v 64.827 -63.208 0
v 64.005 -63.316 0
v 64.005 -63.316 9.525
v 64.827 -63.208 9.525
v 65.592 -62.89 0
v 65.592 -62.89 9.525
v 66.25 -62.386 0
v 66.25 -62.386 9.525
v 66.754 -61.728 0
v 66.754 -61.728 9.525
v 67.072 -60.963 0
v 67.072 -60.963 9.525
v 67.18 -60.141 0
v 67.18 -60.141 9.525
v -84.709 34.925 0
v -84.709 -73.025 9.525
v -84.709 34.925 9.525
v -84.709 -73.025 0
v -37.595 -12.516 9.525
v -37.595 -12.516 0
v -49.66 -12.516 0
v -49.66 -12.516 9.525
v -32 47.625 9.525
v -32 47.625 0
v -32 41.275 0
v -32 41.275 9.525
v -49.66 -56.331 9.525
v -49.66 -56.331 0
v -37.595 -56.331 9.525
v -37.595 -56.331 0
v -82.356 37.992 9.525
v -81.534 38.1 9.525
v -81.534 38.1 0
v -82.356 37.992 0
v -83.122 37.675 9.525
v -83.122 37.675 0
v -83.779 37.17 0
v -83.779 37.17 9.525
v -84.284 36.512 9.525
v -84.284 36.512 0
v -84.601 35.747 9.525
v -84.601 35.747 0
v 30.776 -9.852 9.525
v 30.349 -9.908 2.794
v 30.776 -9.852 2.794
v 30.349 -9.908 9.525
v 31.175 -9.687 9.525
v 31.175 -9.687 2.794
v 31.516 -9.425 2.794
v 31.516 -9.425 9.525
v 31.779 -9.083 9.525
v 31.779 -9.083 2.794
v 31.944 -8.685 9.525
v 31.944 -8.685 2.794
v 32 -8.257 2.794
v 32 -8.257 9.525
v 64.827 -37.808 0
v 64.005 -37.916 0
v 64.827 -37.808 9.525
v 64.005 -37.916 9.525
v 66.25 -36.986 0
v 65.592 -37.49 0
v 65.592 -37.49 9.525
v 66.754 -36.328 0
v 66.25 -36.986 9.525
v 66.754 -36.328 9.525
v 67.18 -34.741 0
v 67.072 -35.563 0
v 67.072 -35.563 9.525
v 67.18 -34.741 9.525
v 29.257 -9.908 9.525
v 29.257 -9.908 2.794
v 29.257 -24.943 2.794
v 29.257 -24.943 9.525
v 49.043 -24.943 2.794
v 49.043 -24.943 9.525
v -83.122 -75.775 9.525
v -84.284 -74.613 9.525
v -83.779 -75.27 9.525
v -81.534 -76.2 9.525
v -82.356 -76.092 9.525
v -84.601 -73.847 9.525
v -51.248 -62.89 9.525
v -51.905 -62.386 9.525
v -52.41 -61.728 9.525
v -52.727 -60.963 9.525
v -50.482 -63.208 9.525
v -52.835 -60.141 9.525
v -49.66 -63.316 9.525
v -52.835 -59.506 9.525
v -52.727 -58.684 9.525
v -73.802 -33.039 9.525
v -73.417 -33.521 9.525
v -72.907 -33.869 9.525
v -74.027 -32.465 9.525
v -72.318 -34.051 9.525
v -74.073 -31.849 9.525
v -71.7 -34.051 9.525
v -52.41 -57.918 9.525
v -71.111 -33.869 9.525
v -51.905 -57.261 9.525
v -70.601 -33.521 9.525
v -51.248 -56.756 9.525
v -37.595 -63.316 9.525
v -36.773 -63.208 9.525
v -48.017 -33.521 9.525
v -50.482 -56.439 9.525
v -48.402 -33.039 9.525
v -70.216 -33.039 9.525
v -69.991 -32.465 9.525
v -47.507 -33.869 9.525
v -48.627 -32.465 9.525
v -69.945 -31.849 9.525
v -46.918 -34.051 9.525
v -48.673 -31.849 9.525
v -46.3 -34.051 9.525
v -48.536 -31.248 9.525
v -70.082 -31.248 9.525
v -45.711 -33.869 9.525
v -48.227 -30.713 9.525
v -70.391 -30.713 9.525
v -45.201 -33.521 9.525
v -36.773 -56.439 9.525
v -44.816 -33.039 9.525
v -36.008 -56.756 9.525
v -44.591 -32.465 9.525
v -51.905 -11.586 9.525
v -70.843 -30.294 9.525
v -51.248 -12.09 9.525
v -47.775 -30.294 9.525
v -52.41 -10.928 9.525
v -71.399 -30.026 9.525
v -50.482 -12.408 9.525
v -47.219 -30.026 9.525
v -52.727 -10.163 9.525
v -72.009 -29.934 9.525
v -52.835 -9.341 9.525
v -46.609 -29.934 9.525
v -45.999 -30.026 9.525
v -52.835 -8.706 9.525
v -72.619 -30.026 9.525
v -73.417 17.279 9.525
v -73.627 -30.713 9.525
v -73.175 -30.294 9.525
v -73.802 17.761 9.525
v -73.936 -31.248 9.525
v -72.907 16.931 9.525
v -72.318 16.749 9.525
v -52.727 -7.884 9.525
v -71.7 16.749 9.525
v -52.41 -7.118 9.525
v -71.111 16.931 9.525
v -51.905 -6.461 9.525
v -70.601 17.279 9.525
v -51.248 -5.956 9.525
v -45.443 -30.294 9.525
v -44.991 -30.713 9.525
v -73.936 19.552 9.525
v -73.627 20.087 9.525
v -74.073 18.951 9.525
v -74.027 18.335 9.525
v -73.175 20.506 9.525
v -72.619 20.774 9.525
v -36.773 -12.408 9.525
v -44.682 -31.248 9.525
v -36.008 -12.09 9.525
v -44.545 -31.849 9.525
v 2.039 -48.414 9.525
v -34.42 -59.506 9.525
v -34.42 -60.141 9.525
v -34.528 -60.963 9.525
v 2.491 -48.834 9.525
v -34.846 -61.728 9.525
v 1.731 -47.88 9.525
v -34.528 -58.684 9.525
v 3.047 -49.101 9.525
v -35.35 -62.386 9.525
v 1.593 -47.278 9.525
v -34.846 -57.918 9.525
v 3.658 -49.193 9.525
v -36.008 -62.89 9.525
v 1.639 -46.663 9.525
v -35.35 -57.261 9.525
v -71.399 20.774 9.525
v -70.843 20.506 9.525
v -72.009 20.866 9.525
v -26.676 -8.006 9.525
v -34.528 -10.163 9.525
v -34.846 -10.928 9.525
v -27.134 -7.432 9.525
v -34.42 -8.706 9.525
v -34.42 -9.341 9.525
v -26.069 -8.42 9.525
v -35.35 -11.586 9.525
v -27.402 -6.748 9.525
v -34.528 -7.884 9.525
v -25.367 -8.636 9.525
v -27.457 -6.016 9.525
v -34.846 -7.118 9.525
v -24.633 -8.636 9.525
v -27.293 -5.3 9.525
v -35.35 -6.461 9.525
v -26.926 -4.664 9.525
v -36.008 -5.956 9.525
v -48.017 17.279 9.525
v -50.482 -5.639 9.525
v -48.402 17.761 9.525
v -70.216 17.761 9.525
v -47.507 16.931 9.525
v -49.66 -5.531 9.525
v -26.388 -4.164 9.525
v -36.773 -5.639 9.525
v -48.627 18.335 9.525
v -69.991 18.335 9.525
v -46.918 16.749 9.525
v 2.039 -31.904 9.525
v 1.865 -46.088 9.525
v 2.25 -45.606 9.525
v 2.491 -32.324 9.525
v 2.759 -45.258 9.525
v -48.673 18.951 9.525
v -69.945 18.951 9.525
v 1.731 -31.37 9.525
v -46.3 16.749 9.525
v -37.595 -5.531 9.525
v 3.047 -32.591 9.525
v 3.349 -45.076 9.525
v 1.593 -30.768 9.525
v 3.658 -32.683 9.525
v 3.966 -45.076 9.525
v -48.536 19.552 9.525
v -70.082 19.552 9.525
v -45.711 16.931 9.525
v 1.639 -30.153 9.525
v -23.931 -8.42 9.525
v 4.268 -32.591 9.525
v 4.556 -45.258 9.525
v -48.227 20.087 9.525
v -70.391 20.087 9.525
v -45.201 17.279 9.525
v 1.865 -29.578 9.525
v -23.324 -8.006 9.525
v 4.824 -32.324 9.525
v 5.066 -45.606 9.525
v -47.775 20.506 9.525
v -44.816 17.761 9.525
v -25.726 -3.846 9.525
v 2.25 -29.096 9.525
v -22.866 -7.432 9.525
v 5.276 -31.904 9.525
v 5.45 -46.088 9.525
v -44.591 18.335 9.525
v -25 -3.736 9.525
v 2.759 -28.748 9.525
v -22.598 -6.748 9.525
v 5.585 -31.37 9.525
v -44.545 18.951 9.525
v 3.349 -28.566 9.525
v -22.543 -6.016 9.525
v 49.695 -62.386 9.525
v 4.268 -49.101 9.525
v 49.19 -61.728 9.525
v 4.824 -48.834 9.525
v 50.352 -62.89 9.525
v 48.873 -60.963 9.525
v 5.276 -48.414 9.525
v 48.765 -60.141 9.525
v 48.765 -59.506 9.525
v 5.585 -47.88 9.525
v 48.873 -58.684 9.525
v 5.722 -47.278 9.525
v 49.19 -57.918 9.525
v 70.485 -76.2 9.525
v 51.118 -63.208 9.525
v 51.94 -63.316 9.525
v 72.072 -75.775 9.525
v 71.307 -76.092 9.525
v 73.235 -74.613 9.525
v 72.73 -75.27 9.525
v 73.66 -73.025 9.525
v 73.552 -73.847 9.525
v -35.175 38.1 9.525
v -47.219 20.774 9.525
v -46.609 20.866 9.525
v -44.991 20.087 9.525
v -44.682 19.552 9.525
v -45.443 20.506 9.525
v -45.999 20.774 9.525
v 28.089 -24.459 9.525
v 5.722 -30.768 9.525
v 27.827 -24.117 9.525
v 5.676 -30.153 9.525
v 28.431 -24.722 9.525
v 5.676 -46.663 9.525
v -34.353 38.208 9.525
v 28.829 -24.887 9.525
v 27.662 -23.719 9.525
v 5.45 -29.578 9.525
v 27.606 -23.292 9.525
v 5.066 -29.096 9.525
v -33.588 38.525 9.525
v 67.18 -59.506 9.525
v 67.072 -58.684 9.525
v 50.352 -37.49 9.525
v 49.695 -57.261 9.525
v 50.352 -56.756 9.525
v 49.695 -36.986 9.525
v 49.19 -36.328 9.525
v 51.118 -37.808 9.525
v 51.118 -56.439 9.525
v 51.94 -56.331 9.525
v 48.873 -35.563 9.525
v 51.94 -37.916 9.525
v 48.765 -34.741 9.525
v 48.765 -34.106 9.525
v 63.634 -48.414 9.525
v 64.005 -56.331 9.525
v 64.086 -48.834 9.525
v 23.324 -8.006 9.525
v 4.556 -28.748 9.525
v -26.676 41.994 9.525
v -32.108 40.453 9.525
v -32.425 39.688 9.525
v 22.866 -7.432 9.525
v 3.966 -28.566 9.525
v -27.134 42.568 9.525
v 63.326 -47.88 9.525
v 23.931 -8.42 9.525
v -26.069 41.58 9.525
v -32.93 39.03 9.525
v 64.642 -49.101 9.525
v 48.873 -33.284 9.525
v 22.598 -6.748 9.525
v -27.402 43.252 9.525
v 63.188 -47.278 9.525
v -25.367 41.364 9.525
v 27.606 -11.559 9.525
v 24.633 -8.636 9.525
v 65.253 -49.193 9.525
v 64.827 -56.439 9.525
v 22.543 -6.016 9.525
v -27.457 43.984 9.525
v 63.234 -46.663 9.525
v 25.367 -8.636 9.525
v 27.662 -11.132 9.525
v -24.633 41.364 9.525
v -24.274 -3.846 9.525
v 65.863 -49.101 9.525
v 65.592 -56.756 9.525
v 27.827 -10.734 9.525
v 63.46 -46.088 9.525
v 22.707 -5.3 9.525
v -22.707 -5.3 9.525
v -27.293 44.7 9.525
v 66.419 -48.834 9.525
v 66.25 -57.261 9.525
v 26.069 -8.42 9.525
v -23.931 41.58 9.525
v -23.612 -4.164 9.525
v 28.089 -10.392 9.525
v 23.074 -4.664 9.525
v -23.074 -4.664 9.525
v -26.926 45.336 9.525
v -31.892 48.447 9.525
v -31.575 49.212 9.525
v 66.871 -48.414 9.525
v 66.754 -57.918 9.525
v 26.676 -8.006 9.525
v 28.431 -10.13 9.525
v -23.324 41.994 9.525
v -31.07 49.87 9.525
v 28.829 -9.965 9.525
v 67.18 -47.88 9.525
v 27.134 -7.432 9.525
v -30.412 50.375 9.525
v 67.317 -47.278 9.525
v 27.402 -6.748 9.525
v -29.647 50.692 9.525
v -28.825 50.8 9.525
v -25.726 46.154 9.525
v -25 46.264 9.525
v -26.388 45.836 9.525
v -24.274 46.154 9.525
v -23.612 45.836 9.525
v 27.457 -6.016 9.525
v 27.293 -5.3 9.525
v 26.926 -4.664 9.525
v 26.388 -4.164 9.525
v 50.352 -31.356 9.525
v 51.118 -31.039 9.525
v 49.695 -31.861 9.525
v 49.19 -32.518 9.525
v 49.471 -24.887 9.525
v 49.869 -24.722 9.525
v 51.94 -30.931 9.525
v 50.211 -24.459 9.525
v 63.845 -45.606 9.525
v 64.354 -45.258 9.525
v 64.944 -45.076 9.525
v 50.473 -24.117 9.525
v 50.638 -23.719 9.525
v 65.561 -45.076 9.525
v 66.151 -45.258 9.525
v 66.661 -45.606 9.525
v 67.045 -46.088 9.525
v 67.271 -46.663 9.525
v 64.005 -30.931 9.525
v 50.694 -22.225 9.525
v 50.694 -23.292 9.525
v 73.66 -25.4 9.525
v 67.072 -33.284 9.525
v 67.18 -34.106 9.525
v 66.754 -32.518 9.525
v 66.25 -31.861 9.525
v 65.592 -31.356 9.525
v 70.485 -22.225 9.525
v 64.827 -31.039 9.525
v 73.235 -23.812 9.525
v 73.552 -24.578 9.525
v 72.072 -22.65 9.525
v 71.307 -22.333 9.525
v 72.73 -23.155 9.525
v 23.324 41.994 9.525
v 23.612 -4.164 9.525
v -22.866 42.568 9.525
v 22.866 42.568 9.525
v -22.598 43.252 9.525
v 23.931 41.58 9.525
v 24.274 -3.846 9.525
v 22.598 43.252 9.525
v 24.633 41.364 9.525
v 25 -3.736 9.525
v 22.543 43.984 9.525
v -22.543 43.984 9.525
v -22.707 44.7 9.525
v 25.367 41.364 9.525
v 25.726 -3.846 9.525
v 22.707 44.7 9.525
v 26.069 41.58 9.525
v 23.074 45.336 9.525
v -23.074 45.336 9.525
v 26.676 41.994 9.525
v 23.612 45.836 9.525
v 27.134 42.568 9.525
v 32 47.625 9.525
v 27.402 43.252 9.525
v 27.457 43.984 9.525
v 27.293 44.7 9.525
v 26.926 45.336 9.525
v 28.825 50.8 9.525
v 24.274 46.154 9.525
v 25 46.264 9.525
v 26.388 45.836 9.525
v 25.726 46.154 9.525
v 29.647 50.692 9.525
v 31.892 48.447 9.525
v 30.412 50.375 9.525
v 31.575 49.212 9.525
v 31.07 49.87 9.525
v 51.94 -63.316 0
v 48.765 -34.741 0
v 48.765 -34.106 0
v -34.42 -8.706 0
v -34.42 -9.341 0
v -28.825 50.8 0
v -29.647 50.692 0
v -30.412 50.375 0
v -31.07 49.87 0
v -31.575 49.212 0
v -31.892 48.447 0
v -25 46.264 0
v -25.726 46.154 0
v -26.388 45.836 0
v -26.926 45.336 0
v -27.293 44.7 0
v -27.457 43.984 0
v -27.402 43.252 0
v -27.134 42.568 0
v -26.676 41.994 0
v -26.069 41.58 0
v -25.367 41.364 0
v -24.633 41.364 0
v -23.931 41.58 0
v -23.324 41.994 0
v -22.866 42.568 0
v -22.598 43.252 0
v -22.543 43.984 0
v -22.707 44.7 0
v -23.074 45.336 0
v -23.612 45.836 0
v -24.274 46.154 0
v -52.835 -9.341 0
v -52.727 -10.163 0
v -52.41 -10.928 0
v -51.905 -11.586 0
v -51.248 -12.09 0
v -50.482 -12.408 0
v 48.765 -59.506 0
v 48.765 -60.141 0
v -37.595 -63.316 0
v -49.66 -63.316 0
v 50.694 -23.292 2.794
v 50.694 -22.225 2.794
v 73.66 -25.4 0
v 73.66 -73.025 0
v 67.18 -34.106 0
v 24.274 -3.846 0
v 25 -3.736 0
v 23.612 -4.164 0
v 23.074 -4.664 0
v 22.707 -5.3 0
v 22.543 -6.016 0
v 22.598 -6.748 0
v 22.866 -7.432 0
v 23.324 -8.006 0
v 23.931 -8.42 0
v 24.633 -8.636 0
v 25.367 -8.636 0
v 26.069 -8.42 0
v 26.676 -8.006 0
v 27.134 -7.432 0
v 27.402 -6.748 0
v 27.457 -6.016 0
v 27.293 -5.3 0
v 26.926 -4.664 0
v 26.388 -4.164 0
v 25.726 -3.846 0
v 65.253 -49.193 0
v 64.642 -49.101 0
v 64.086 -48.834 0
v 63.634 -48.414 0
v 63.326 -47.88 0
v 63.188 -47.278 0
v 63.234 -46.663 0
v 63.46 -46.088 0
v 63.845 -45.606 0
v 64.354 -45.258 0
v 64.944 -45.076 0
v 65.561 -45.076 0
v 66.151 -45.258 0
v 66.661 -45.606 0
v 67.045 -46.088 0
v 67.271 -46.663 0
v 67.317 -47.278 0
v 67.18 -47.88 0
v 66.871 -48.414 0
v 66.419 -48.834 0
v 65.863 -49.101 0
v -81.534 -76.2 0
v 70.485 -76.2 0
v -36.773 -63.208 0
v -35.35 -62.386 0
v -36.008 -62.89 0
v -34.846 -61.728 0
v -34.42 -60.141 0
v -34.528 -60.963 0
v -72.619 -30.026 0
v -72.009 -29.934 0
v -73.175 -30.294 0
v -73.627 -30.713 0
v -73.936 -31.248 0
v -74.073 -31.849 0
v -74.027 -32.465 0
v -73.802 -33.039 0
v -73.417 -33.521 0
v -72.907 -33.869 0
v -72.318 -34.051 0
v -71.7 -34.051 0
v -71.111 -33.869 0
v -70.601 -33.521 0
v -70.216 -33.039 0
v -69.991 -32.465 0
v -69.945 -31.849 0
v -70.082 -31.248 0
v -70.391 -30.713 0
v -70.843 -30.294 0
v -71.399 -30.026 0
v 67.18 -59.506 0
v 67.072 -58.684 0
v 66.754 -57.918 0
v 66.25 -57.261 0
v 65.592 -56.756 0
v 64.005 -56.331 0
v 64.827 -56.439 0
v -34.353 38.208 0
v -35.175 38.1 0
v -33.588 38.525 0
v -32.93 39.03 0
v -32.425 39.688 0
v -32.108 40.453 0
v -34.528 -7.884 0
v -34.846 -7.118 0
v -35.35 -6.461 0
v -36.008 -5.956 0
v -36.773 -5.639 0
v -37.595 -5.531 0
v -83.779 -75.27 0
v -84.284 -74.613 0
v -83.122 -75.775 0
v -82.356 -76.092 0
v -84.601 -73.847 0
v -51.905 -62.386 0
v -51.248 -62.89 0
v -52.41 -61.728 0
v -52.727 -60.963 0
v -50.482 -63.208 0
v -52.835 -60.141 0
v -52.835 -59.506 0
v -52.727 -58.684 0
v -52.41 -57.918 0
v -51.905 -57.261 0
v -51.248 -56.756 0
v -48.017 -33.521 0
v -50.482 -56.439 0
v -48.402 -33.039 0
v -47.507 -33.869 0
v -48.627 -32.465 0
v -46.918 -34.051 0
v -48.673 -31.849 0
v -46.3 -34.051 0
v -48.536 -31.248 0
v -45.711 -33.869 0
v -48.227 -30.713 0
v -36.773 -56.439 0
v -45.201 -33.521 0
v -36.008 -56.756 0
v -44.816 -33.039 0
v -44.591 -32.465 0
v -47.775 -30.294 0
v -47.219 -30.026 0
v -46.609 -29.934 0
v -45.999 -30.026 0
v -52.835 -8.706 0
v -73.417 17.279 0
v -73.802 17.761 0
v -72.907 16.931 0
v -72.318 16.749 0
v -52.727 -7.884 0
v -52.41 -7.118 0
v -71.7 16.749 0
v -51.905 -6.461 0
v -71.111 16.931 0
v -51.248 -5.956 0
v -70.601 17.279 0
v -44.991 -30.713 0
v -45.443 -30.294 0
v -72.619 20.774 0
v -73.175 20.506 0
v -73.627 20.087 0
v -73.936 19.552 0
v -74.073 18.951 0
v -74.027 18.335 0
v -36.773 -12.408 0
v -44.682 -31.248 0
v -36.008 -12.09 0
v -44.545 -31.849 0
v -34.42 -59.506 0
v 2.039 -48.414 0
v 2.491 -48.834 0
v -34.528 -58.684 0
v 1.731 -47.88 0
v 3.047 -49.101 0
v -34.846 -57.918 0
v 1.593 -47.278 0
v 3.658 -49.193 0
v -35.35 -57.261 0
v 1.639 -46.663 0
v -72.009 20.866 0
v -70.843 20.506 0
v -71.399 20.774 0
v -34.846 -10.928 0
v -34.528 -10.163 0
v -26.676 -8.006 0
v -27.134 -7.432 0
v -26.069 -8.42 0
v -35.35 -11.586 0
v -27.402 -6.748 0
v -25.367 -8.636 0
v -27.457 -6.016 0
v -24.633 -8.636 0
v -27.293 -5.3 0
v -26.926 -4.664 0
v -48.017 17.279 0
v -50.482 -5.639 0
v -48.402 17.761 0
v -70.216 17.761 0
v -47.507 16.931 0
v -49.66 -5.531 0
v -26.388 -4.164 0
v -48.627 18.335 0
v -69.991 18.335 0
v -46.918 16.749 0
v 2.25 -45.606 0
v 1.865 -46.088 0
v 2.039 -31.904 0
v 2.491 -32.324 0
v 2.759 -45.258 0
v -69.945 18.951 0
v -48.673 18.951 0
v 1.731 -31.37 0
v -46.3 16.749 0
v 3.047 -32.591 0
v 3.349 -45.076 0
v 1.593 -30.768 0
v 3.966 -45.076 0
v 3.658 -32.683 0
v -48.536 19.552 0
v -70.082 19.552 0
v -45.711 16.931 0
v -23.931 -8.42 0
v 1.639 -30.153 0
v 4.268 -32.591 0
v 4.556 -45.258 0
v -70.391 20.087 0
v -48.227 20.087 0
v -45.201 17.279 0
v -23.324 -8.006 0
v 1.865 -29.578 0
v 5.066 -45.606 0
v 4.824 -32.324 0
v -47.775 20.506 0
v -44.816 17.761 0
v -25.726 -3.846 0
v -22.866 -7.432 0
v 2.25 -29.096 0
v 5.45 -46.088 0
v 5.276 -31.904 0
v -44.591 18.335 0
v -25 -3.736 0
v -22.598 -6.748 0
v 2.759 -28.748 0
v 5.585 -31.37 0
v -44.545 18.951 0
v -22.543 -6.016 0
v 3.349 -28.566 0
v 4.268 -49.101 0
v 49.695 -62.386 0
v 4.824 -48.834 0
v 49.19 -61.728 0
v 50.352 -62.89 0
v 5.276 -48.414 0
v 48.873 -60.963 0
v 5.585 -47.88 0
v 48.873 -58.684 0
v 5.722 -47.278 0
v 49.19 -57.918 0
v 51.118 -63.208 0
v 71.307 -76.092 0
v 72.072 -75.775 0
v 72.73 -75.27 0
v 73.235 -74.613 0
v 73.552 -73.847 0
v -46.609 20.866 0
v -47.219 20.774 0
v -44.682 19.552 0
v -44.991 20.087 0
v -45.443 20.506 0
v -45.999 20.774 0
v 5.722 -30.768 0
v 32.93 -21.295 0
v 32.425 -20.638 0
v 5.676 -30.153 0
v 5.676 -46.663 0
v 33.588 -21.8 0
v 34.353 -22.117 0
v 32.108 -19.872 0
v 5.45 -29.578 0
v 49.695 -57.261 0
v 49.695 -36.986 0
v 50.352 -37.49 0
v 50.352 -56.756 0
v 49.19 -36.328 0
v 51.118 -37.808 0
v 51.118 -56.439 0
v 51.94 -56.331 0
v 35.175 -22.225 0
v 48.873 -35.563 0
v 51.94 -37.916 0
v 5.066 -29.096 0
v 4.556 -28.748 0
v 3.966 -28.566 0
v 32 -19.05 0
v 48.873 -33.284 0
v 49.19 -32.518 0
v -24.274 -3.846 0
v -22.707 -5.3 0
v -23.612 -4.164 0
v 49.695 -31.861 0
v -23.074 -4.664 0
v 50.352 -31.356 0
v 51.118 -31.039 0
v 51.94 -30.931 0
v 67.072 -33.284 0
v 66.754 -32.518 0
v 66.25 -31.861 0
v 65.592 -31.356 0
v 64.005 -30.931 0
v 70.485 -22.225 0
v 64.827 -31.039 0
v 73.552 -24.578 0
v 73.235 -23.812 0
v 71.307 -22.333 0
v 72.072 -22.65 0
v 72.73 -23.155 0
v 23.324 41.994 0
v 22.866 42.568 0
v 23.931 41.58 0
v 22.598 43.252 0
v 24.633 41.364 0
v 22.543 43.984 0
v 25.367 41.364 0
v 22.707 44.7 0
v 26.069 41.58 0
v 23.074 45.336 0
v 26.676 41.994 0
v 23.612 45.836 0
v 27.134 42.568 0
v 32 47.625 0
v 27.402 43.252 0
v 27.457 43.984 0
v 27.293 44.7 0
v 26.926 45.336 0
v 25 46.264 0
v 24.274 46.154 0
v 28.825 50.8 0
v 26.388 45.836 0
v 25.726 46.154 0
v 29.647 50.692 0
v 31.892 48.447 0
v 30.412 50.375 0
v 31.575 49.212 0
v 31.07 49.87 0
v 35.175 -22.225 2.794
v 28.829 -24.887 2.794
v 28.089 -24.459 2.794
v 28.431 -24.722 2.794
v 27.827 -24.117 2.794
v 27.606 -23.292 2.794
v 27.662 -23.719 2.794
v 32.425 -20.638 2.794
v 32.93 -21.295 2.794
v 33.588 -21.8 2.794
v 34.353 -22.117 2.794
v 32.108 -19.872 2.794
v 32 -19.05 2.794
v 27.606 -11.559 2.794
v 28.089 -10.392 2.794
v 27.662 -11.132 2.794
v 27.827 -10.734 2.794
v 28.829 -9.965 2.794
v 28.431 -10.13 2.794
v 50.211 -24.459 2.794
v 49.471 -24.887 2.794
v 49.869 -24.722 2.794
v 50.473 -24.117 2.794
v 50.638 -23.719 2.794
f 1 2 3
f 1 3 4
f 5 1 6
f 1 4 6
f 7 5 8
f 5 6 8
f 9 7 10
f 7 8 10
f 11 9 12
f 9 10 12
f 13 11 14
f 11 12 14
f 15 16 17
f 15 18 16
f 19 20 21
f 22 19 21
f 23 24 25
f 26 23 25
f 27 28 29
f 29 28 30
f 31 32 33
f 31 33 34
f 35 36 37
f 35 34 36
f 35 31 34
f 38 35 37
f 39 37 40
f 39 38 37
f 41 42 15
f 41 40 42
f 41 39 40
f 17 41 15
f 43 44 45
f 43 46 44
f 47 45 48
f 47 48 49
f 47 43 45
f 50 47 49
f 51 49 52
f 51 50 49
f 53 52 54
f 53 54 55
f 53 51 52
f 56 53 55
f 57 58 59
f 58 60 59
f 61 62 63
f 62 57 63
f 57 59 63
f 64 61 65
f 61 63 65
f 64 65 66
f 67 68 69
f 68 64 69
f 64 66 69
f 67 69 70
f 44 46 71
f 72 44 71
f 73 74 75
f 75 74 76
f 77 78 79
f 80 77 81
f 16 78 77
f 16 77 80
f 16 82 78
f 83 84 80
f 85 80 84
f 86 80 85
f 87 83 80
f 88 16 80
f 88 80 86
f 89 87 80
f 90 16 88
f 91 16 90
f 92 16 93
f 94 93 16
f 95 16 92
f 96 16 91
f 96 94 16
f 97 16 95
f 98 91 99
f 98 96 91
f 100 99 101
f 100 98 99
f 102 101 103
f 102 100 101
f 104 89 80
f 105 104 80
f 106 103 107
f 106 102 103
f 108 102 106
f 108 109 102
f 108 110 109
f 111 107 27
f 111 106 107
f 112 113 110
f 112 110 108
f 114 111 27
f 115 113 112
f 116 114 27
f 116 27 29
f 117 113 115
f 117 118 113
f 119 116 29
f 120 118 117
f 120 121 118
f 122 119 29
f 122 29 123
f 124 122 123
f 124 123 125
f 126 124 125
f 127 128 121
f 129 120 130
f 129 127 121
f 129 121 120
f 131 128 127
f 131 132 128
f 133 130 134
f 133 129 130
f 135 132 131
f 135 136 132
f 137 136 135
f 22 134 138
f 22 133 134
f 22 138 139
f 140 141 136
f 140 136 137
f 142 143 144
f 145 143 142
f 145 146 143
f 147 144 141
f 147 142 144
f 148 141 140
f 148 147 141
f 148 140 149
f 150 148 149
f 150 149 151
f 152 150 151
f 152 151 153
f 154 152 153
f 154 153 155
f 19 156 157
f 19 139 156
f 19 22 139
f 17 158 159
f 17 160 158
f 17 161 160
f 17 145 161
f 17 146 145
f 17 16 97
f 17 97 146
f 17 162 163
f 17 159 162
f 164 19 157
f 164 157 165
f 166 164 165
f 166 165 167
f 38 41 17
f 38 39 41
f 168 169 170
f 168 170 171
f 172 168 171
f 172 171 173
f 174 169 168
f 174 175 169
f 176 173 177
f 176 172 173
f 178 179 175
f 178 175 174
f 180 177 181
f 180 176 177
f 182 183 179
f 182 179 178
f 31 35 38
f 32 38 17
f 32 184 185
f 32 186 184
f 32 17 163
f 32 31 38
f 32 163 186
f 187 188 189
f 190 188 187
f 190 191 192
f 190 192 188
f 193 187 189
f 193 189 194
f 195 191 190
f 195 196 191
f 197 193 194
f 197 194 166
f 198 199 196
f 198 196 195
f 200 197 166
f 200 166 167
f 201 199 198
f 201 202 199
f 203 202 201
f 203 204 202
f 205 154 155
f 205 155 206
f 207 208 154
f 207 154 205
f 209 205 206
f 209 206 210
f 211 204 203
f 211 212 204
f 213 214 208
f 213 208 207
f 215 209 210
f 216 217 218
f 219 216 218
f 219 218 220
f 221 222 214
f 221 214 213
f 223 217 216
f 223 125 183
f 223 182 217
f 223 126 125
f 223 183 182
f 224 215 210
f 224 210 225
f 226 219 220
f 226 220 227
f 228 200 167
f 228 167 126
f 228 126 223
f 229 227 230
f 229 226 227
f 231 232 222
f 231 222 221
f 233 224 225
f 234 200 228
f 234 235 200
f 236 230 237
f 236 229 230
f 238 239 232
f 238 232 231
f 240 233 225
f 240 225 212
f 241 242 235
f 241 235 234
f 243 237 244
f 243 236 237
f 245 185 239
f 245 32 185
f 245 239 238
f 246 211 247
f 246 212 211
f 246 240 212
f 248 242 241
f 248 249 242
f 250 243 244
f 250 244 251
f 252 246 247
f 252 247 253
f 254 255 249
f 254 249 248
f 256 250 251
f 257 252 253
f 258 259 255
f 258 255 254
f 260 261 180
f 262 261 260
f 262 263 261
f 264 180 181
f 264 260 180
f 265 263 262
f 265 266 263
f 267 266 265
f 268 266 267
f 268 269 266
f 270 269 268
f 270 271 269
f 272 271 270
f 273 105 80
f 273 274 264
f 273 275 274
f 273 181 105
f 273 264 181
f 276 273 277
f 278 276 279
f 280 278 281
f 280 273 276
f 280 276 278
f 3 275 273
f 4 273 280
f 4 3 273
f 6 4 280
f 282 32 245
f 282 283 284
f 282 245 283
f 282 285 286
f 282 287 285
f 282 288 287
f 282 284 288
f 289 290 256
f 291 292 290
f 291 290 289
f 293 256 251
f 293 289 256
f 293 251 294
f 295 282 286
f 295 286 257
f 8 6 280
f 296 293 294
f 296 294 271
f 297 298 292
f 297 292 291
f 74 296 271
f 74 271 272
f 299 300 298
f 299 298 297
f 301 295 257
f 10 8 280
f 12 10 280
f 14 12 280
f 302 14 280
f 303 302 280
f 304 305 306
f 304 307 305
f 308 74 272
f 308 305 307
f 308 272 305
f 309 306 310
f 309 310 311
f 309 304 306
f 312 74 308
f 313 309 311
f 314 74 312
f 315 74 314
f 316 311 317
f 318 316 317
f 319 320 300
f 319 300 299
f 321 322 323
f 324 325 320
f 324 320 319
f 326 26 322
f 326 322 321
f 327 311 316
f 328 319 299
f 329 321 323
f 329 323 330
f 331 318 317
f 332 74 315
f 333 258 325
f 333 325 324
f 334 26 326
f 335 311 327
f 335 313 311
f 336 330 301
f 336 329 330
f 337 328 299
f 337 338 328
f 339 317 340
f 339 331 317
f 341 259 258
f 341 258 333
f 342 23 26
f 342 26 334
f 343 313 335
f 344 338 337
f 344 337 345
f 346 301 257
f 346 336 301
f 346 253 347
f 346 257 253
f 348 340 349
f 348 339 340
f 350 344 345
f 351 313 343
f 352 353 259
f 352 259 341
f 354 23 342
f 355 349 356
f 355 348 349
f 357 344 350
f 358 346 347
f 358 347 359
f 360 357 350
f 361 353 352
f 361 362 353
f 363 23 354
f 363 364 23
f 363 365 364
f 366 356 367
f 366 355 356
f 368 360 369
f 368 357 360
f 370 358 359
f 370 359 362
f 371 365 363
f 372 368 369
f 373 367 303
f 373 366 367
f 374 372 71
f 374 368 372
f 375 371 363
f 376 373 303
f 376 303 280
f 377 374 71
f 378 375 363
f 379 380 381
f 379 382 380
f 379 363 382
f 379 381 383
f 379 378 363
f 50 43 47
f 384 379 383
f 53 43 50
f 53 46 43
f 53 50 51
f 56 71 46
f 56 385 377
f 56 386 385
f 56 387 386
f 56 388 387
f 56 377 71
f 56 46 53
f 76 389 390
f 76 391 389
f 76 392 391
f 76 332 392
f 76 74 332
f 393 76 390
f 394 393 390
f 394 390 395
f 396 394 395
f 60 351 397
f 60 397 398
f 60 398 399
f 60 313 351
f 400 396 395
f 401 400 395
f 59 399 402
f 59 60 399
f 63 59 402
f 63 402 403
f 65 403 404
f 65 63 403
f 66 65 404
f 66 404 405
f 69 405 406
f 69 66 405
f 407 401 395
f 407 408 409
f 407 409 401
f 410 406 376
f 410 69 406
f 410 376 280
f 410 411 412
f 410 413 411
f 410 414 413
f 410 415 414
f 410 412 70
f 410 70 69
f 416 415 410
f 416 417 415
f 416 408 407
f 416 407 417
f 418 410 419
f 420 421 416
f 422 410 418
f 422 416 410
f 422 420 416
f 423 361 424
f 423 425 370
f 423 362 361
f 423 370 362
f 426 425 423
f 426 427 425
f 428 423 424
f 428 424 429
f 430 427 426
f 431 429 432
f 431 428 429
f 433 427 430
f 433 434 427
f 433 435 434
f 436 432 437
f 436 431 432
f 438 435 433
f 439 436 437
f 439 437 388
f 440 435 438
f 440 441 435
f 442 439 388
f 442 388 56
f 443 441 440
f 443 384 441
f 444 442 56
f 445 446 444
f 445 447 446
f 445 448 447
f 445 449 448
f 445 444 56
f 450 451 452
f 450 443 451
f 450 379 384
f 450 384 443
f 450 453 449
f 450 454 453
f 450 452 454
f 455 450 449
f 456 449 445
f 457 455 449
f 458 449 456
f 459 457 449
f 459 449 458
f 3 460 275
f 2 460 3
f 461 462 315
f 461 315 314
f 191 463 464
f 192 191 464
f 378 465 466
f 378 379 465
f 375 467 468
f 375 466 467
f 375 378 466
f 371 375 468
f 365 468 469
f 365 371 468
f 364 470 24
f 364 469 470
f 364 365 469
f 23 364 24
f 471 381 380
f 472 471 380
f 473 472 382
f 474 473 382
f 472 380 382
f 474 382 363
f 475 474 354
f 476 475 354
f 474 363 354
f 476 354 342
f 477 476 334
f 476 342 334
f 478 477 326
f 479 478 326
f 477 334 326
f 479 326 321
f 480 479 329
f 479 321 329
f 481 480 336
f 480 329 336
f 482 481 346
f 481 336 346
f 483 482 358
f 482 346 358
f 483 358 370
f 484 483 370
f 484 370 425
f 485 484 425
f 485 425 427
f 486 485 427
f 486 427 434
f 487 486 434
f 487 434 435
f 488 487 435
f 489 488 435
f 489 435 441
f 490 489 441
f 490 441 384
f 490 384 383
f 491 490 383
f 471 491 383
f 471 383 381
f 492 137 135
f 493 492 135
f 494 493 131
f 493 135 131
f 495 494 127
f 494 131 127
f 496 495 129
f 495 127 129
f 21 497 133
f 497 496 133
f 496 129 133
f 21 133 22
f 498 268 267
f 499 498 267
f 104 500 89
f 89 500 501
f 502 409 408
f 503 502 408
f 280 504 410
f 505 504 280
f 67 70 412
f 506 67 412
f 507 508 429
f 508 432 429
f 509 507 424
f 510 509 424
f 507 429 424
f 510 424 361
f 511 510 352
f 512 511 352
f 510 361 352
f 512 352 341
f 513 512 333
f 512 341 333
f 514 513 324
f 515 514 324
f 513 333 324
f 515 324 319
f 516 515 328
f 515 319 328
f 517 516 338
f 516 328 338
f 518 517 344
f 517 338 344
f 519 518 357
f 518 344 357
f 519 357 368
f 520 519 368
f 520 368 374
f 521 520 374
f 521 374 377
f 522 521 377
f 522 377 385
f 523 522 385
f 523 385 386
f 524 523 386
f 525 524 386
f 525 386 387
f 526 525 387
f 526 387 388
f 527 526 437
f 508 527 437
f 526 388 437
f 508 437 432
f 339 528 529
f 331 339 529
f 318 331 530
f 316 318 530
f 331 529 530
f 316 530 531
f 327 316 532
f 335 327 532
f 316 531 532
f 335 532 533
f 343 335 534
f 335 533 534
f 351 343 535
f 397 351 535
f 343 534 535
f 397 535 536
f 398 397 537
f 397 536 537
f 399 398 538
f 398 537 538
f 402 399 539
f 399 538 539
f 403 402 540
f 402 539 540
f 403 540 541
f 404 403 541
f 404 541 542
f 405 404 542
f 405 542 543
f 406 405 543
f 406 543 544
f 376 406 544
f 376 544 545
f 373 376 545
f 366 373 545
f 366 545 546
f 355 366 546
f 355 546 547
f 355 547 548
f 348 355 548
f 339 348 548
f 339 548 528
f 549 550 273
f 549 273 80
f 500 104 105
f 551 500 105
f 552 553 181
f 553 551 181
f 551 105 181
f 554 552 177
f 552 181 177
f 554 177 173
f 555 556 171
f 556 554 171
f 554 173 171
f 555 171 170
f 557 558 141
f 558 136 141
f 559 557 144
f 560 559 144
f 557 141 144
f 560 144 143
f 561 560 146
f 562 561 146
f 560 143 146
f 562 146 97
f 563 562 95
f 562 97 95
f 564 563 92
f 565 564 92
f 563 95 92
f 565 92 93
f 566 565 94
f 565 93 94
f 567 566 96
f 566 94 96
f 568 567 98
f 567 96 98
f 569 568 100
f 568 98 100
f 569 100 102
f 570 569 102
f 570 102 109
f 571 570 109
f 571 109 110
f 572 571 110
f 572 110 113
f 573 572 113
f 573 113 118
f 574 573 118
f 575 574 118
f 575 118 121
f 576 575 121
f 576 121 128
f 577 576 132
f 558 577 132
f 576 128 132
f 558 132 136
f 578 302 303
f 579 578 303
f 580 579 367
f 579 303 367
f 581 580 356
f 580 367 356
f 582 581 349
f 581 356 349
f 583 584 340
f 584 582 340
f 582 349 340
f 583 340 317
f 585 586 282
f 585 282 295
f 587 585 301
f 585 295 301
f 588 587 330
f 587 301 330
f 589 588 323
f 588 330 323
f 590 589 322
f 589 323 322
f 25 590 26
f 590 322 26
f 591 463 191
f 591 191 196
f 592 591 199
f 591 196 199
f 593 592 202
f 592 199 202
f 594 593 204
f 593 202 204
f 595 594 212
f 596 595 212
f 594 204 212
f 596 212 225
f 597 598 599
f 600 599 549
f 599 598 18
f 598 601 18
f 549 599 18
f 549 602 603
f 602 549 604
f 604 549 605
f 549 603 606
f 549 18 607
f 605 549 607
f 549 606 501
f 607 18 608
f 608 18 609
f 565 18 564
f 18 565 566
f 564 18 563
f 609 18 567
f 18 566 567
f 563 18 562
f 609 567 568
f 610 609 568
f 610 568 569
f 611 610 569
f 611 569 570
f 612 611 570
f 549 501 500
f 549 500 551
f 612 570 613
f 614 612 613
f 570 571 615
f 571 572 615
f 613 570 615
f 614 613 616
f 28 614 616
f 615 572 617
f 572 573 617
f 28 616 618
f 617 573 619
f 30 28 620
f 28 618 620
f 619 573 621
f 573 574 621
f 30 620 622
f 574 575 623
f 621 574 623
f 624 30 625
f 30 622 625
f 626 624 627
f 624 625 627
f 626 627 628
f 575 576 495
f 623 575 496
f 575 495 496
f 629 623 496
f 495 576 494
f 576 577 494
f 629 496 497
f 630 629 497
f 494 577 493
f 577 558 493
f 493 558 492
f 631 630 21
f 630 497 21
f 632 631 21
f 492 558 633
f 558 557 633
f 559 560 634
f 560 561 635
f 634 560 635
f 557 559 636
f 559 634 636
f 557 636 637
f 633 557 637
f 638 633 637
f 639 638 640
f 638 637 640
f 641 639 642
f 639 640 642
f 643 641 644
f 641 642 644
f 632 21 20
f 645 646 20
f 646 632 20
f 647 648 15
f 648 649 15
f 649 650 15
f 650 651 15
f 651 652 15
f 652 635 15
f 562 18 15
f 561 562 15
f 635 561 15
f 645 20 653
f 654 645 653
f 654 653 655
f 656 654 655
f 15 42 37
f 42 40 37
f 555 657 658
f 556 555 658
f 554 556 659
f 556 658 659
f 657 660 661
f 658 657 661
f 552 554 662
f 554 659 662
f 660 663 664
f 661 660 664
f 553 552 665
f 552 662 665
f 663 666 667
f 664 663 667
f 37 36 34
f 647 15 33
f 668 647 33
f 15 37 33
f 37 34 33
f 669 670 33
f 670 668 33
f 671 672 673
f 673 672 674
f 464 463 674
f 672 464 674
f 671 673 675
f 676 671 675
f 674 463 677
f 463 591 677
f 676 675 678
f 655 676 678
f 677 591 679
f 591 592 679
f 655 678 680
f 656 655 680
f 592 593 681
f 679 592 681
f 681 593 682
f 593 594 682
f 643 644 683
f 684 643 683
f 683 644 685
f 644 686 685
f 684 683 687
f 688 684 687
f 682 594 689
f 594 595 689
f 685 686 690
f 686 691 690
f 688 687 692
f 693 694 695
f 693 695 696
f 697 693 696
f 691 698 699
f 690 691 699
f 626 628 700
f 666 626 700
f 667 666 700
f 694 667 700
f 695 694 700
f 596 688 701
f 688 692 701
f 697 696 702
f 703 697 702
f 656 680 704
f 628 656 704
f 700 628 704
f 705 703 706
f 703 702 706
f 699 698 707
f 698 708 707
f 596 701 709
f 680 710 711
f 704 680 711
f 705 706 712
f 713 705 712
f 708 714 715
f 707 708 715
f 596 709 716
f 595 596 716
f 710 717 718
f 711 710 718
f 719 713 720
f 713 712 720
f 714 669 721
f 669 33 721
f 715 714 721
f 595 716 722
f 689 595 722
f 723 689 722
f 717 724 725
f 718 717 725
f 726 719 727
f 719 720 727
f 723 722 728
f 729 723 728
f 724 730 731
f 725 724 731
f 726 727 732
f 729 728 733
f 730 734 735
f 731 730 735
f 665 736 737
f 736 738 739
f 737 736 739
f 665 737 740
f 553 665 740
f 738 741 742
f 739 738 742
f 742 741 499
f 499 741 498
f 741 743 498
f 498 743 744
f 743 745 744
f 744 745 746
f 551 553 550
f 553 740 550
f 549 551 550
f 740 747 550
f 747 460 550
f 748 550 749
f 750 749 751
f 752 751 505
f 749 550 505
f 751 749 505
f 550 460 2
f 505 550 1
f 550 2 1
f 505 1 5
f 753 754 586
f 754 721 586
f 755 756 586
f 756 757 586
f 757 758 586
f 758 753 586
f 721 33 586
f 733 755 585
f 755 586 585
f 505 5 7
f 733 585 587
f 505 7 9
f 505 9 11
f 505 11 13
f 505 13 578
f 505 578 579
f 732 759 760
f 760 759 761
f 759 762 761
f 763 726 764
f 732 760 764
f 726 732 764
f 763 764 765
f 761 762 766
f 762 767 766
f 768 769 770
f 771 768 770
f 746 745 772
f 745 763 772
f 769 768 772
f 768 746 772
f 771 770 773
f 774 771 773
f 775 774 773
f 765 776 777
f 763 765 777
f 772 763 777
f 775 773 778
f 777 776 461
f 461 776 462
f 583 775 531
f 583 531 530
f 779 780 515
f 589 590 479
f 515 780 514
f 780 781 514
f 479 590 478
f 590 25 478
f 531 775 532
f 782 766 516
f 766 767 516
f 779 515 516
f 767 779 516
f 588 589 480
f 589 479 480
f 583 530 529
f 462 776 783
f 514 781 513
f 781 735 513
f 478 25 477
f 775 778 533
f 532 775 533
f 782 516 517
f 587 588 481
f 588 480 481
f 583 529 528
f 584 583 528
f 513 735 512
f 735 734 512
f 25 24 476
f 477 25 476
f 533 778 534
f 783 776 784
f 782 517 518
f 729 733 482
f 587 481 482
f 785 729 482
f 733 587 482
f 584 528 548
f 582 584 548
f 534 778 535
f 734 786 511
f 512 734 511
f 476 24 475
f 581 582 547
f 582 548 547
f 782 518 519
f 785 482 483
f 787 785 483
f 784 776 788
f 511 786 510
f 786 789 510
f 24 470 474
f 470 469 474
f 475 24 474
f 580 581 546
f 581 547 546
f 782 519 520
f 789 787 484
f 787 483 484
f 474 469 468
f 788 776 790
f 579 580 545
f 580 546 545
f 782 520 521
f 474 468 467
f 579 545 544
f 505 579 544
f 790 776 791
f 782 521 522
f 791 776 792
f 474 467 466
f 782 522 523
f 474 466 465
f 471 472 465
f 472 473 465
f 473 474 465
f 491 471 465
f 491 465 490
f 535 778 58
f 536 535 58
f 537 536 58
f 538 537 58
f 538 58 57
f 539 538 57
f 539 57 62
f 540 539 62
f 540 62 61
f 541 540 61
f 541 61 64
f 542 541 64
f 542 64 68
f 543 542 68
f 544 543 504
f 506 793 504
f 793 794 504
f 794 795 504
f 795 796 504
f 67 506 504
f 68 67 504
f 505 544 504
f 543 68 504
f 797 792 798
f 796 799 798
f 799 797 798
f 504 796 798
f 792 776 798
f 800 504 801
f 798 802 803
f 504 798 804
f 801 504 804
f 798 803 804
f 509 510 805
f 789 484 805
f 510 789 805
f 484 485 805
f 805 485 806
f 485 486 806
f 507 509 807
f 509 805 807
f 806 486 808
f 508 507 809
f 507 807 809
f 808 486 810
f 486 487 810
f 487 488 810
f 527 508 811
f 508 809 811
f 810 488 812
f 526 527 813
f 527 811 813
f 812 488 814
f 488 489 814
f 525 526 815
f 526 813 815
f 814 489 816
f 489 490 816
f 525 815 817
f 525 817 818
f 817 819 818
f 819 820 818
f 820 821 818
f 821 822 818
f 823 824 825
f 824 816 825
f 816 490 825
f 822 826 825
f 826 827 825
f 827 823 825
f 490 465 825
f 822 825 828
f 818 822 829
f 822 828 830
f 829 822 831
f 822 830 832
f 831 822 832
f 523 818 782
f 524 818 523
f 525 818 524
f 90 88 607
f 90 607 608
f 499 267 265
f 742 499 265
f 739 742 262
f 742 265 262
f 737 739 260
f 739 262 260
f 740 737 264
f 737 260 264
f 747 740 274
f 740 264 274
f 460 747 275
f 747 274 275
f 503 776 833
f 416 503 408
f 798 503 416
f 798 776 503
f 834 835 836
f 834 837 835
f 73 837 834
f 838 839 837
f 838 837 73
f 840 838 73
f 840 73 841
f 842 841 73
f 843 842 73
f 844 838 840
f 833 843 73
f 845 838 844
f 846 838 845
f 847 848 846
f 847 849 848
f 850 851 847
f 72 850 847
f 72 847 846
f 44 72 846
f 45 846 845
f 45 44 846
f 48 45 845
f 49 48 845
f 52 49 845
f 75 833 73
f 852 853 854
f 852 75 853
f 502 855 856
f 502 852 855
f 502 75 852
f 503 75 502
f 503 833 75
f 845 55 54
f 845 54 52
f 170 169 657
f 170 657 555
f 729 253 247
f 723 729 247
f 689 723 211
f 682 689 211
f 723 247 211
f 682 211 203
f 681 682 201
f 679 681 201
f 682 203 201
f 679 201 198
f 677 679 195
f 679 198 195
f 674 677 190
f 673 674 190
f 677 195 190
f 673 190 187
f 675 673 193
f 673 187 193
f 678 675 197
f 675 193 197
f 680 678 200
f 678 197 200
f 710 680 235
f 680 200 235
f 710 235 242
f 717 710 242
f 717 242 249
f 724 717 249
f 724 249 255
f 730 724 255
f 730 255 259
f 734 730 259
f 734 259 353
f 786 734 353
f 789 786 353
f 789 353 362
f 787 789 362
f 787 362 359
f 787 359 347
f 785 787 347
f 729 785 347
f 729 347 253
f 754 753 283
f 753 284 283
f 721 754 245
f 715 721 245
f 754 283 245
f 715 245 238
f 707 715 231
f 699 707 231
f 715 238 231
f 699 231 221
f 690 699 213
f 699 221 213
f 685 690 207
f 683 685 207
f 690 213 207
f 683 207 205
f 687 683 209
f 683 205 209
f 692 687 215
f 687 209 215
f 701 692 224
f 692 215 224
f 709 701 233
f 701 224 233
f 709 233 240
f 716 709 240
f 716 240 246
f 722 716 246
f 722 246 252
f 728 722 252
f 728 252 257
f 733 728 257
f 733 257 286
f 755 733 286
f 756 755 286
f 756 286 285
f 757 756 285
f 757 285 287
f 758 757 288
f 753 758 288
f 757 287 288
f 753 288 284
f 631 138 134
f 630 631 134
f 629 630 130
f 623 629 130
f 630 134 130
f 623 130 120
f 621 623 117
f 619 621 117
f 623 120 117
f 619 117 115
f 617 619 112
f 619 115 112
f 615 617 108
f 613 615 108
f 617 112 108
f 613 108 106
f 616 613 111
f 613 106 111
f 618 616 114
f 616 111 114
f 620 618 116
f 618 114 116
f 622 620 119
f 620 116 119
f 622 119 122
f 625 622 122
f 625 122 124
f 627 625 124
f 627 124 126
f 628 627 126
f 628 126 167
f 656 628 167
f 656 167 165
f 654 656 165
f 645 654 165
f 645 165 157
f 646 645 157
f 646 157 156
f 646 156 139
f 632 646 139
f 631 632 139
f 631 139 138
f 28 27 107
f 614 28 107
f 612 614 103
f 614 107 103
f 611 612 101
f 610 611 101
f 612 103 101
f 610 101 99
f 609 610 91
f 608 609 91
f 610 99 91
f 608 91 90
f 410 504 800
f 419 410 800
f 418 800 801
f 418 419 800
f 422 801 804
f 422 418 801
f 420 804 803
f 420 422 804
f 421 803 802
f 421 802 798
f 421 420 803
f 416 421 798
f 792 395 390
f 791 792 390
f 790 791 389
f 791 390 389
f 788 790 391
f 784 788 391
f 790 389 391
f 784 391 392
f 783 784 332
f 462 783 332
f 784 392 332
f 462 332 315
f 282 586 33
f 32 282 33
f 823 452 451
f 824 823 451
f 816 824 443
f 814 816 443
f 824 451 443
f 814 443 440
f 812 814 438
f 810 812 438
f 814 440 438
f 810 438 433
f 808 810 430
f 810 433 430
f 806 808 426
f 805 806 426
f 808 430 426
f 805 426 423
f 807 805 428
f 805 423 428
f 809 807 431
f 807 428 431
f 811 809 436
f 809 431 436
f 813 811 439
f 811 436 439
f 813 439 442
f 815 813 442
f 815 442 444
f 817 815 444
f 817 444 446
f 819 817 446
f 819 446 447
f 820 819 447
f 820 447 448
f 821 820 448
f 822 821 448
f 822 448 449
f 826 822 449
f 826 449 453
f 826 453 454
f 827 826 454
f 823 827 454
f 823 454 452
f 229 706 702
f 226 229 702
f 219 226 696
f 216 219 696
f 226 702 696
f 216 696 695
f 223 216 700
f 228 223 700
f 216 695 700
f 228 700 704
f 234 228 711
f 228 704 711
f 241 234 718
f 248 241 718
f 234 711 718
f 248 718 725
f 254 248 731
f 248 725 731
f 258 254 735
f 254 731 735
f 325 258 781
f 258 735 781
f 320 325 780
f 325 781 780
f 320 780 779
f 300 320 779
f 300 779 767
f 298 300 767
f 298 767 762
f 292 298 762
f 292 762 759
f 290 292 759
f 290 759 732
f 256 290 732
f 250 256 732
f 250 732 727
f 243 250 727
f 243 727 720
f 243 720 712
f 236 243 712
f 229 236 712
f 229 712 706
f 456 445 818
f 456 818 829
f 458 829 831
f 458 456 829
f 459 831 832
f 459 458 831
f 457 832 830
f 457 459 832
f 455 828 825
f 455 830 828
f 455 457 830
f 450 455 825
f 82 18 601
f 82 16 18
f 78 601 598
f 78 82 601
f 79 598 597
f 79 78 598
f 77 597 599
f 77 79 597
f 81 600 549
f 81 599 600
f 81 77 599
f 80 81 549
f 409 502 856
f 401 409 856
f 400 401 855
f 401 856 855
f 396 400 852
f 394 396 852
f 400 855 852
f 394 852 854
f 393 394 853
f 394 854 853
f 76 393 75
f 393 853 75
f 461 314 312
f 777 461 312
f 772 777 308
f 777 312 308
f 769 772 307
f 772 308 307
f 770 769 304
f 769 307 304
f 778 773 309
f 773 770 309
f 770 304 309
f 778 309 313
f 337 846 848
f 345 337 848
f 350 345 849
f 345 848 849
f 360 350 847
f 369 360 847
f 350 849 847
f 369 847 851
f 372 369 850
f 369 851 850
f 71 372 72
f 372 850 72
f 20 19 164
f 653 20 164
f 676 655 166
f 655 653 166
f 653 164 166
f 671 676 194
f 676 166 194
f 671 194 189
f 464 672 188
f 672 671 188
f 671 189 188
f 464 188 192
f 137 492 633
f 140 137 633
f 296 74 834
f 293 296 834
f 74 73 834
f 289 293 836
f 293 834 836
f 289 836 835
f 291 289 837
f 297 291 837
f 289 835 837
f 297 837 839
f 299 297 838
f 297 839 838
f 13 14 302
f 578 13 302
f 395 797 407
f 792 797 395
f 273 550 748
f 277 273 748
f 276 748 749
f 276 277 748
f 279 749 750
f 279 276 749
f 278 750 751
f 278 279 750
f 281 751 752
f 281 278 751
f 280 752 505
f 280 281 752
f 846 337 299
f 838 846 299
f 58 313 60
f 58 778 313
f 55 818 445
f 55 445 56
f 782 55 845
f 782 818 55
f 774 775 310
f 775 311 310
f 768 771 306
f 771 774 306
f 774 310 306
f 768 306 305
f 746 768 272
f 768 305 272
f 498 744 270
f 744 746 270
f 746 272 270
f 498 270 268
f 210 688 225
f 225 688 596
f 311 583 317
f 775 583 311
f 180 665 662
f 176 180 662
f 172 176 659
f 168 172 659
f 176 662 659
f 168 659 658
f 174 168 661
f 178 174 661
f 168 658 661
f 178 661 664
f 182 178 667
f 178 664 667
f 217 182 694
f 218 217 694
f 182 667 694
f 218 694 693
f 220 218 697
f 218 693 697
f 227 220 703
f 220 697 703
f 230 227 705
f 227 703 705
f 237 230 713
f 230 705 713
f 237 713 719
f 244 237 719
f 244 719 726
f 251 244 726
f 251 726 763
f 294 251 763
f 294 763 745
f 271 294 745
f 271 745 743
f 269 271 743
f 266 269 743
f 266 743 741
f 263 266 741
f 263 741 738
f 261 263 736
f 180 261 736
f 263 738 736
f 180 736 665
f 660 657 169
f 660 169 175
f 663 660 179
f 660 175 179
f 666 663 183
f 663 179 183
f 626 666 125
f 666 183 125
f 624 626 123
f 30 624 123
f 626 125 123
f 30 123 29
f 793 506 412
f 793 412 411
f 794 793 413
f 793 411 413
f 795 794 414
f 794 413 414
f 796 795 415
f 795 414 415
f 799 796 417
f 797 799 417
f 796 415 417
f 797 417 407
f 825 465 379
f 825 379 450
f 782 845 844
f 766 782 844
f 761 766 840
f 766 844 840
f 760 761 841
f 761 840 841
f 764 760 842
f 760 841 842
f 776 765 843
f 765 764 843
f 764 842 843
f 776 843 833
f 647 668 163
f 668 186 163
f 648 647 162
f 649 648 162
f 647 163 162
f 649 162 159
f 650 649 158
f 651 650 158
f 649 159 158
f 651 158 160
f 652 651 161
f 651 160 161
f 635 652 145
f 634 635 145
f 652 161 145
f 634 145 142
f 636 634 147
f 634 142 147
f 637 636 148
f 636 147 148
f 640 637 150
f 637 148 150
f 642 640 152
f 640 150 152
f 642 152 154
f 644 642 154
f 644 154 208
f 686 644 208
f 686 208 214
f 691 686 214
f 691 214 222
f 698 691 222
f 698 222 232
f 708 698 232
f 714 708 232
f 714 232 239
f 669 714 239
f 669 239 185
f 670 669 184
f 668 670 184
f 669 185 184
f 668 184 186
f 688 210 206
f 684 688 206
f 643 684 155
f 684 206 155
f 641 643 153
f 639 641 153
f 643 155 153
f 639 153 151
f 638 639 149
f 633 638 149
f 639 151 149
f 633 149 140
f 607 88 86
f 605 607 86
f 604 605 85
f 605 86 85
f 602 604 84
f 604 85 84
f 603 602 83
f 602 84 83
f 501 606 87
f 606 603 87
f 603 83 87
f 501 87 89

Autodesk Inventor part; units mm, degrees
ref_plane "YZ Plane" through (0, 0, 0) normal (1, 0, 0) x (0, 1, 0)
ref_plane "XZ Plane" through (0, 0, 0) normal (0, 1, 0) x (-1, 0, 0)
ref_plane "XY Plane" through (0, 0, 0) normal (0, 0, 1) x (1, 0, 0)
sketch "Sketch1" plane through (0, 0, 0) normal (0, 0, 1) x (1, 0, 0)
  line L0 (73.66, -76.2) -> (-84.709, -76.2)
  line L1 (-84.709, -76.2) -> (-84.709, 50.8)
  line L2 (-84.709, 50.8) -> (73.66, 50.8)
  line L3 (73.66, 50.8) -> (73.66, -76.2)
  line L4 (-84.709, 50.8) -> (-32, 50.8)
  line L5 (-32, 50.8) -> (-32, 38.1)
  line L6 (-32, 38.1) -> (-84.709, 38.1)
  line L7 (-84.709, 38.1) -> (-84.709, 50.8)
  line L8 (73.66, 50.8) -> (32, 50.8)
  line L9 (32, 50.8) -> (32, -22.225)
  line L10 (32, -22.225) -> (73.66, -22.225)
  line L11 (73.66, -22.225) -> (73.66, 50.8)
  line L12 (-34.4202, -12.5158) -> (-52.8352, -12.5158)
  line L13 (-52.8352, -12.5158) -> (-52.8352, -5.5308)
  line L14 (-52.8352, -5.5308) -> (-34.4202, -5.5308)
  line L15 (-34.4202, -5.5308) -> (-34.4202, -12.5158)
  line L16 (-34.4202, -12.5158) -> (-52.8352, -5.5308) construction
  line L17 (-52.8352, -12.5158) -> (-34.4202, -5.5308) construction
  line L18 (-34.4202, -63.3158) -> (-52.8352, -63.3158)
  line L19 (-52.8352, -63.3158) -> (-52.8352, -56.3308)
  line L20 (-52.8352, -56.3308) -> (-34.4202, -56.3308)
  line L21 (-34.4202, -56.3308) -> (-34.4202, -63.3158)
  line L22 (-34.4202, -63.3158) -> (-52.8352, -56.3308) construction
  line L23 (-52.8352, -63.3158) -> (-34.4202, -56.3308) construction
  line L24 (48.7648, -63.3158) -> (67.1798, -63.3158)
  line L25 (67.1798, -63.3158) -> (67.1798, -56.3308)
  line L26 (67.1798, -56.3308) -> (48.7648, -56.3308)
  line L27 (48.7648, -56.3308) -> (48.7648, -63.3158)
  line L28 (48.7648, -63.3158) -> (67.1798, -56.3308) construction
  line L29 (67.1798, -63.3158) -> (48.7648, -56.3308) construction
  line L30 (-43.6277, -59.8233) -> (-43.6277, -9.0233) construction
  line L31 (-43.6277, -59.8233) -> (-43.6277, -56.3308) construction
  line L32 (-25, 43.8) -> (25, 43.8) construction
  line L33 (25, 43.8) -> (25, -6.2) construction
  line L34 (25, -6.2) -> (-25, -6.2) construction
  line L35 (-25, -6.2) -> (-25, 43.8) construction
  line L36 (-25, 18.8) -> (25, 18.8) construction
  line L37 (57.9723, -59.8233) -> (-43.6277, -59.8233) construction
  line L38 (0, 43.8) -> (0, -6.2) construction
  line L39 (32, -13.2) -> (-32, -13.2) construction
  line L40 (-32, -13.2) -> (-32, 50.8) construction
  line L41 (-32, 50.8) -> (32, 50.8) construction
  line L42 (32, 50.8) -> (32, -13.2) construction
  line L43 (32, -13.2) -> (-32, 50.8) construction
  line L44 (-32, -13.2) -> (32, 50.8) construction
  circle A0 centre (-37.6333, -9.0233) radius 3.0299 construction
  circle A1 centre (-43.6277, -9.0233) radius 2.9972 construction
  circle A2 centre (-37.6333, -9.0233) radius 4.7625 construction
  line L45 (0, 76.2) -> (0, -101.6) projected
  line L46 (57.9723, -59.8233) -> (57.9723, -34.4233) construction
  line L47 (67.1798, -30.9308) -> (48.7648, -30.9308)
  line L48 (48.7648, -30.9308) -> (48.7648, -37.9158)
  line L49 (48.7648, -37.9158) -> (67.1798, -37.9158)
  line L50 (67.1798, -37.9158) -> (67.1798, -30.9308)
  line L51 (67.1798, -30.9308) -> (48.7648, -37.9158) construction
  line L52 (48.7648, -30.9308) -> (67.1798, -37.9158) construction
  point P0 (0, 0)
  point P1 (0, 0)
  point P2 (0, 0)
  point P3 (0, 18.8)
  dimension "d1" = 127
  dimension "d2" = 12.7
  dimension "d24" = 6.985
  dimension "d25" = 18.415
  dimension "d26" = 6.985
  dimension "d34" = 6.985
  dimension "d40" = 50
  dimension "d41" = 50
  dimension "d45" = 101.6
  dimension "d48" = 59.8233
  dimension "d49" = 50.8
  dimension "d50" = 64
  dimension "d51" = 64
  dimension "d52" = 0
  dimension "d53" = 5.9944
  dimension "d54" = 5.9944
  dimension "d57" = 50.8
  dimension "d60" = 9.525
  dimension "d61" = 73.025
  dimension "d63" = 64
  dimension "d64" = 0
  dimension "d65" = 84.709
  dimension "d66" = 73.66
  dimension "d67" = 43.6277
  dimension "d68" = 6.4802
  dimension "d69" = 158.369
  dimension "d70" = 31.8738
  dimension "d71" = 25.4
extrude "Extrusion1" add sketch "Sketch1" along normal blind 9.525 contours L0 L45 L2 L9 L10 L3 | L0 L1 L6 L5 L2 L45 | L12 L13 L14 L15 | L18 L19 L20 L21 | L27 L26 L25 L24 | L50 L49 L48 L47
hole "Hole1" at (-25, 43.8, 0) at (25, 43.8, 0) at (25, -6.2, 0) at (-25, -6.2, 0) direction (0, 0, 1) diameter 4.9276 end through all
extrude "Extrusion2" cut sketch "Sketch1" along normal up to next contours L12 L13 L14 L15 | L18 L19 L20 L21 | L27 L26 L25 L24 | L50 L49 L48 L47
sketch "Sketch3" plane through (0, 0, 9.525) normal (0, 0, 1) x (1, 0, 0)
  line L0 (73.66, -22.225) -> (32, -22.225) projected
  line L1 (32, -22.225) -> (32, 50.8) projected
  line L2 (27.6058, -24.9428) -> (50.6944, -24.9428)
  line L3 (50.6944, -24.9428) -> (50.6944, -9.9084)
  line L4 (50.6944, -9.9084) -> (27.6058, -9.9084)
  line L5 (27.6058, -9.9084) -> (27.6058, -24.9428)
  point P0 (0, 0)
  dimension "d99" = 23.0886
  dimension "d100" = 2.7178
  dimension "d101" = 4.3942
extrude "Extrusion4" cut sketch "Sketch3" against normal blind 6.731
fillet "Fillet1" radius 3.175 8 edges at (-32, 38.1, 4.7625) (-32, 50.8, 4.7625) (32, 50.8, 4.7625) (73.66, -22.225, 4.7625) (-84.709, 38.1, 4.7625) (-84.709, -76.2, 4.7625) (73.66, -76.2, 4.7625) (32, -22.225, 1.397)
fillet "Fillet2" radius 3.175 16 edges at (-52.8352, -63.3158, 4.7625) (-52.8352, -12.5158, 4.7625) (-52.8352, -56.3308, 4.7625) (-52.8352, -5.5308, 4.7625) (48.7648, -63.3158, 4.7625) (48.7648, -56.3308, 4.7625) (67.1798, -56.3308, 4.7625) (67.1798, -63.3158, 4.7625) (-34.4202, -5.5308, 4.7625) (-34.4202, -12.5158, 4.7625) (-34.4202, -56.3308, 4.7625) (-34.4202, -63.3158, 4.7625) (48.7648, -30.9308, 4.7625) (48.7648, -37.9158, 4.7625) (67.1798, -30.9308, 4.7625) (67.1798, -37.9158, 4.7625)
sketch "Sketch2" plane through (0, 0, 0) normal (0, 0, 1) x (1, 0, 0)
  line L0 (-72.009, 18.796) -> (-46.609, 18.796) construction
  line L1 (-46.609, 18.796) -> (-46.609, -32.004) construction
  line L2 (-46.609, -32.004) -> (-72.009, -32.004) construction
  line L3 (-72.009, -32.004) -> (-72.009, 18.796) construction
  line L4 (-35.175, 38.1) -> (-81.534, 38.1) construction
  line L5 (-84.709, 34.925) -> (-84.709, -73.025) construction
  line L6 (-52.8352, -9.3408) -> (-52.8352, -8.7058) construction
  line L7 (-52.8352, -9.0233) -> (-63.8216, -9.0233) construction
  point P0 (0, 0)
  dimension "d73" = 25.4
  dimension "d74" = 50.8
  dimension "d75" = 19.304
  dimension "d76" = 12.7
  dimension "d77" = 47.1232
hole "Hole2" at (-72.009, 18.796, 0) at (-46.609, 18.796, 0) at (-46.609, -32.004, 0) at (-72.009, -32.004, 0) direction (0, 0, 1) diameter 4.1402 end through all
fillet "Fillet5" radius 1.651 4 edges at (32, -9.9084, 6.1595) (27.6058, -9.9084, 6.1595) (27.6058, -24.9428, 6.1595) (50.6944, -24.9428, 6.1595)
sketch "Sketch4" plane through (0, 0, 9.525) normal (0, 0, 1) x (1, 0, 0)
  line L0 (57.9723, -34.4233) -> (57.9723, -59.8233) construction
  line L1 (57.9723, -47.1233) -> (65.2526, -47.1233) construction
  line L2 (73.66, -73.025) -> (73.66, -25.4) construction
  point P0 (0, 0)
  point P1 (3.6576, -47.1233)
  point P2 (3.6576, -30.6133)
  dimension "d107" = 8.4074
  dimension "d115" = 61.595
  dimension "d116" = 16.51
hole "Hole3" at (65.2526, -47.1233, 9.525) at (3.6576, -47.1233, 9.525) at (3.6576, -30.6133, 9.525) direction (0, 0, -1) diameter 4.1402 end through all
properties part number "J005167" material "ALUMINUM, 6061-T651"
